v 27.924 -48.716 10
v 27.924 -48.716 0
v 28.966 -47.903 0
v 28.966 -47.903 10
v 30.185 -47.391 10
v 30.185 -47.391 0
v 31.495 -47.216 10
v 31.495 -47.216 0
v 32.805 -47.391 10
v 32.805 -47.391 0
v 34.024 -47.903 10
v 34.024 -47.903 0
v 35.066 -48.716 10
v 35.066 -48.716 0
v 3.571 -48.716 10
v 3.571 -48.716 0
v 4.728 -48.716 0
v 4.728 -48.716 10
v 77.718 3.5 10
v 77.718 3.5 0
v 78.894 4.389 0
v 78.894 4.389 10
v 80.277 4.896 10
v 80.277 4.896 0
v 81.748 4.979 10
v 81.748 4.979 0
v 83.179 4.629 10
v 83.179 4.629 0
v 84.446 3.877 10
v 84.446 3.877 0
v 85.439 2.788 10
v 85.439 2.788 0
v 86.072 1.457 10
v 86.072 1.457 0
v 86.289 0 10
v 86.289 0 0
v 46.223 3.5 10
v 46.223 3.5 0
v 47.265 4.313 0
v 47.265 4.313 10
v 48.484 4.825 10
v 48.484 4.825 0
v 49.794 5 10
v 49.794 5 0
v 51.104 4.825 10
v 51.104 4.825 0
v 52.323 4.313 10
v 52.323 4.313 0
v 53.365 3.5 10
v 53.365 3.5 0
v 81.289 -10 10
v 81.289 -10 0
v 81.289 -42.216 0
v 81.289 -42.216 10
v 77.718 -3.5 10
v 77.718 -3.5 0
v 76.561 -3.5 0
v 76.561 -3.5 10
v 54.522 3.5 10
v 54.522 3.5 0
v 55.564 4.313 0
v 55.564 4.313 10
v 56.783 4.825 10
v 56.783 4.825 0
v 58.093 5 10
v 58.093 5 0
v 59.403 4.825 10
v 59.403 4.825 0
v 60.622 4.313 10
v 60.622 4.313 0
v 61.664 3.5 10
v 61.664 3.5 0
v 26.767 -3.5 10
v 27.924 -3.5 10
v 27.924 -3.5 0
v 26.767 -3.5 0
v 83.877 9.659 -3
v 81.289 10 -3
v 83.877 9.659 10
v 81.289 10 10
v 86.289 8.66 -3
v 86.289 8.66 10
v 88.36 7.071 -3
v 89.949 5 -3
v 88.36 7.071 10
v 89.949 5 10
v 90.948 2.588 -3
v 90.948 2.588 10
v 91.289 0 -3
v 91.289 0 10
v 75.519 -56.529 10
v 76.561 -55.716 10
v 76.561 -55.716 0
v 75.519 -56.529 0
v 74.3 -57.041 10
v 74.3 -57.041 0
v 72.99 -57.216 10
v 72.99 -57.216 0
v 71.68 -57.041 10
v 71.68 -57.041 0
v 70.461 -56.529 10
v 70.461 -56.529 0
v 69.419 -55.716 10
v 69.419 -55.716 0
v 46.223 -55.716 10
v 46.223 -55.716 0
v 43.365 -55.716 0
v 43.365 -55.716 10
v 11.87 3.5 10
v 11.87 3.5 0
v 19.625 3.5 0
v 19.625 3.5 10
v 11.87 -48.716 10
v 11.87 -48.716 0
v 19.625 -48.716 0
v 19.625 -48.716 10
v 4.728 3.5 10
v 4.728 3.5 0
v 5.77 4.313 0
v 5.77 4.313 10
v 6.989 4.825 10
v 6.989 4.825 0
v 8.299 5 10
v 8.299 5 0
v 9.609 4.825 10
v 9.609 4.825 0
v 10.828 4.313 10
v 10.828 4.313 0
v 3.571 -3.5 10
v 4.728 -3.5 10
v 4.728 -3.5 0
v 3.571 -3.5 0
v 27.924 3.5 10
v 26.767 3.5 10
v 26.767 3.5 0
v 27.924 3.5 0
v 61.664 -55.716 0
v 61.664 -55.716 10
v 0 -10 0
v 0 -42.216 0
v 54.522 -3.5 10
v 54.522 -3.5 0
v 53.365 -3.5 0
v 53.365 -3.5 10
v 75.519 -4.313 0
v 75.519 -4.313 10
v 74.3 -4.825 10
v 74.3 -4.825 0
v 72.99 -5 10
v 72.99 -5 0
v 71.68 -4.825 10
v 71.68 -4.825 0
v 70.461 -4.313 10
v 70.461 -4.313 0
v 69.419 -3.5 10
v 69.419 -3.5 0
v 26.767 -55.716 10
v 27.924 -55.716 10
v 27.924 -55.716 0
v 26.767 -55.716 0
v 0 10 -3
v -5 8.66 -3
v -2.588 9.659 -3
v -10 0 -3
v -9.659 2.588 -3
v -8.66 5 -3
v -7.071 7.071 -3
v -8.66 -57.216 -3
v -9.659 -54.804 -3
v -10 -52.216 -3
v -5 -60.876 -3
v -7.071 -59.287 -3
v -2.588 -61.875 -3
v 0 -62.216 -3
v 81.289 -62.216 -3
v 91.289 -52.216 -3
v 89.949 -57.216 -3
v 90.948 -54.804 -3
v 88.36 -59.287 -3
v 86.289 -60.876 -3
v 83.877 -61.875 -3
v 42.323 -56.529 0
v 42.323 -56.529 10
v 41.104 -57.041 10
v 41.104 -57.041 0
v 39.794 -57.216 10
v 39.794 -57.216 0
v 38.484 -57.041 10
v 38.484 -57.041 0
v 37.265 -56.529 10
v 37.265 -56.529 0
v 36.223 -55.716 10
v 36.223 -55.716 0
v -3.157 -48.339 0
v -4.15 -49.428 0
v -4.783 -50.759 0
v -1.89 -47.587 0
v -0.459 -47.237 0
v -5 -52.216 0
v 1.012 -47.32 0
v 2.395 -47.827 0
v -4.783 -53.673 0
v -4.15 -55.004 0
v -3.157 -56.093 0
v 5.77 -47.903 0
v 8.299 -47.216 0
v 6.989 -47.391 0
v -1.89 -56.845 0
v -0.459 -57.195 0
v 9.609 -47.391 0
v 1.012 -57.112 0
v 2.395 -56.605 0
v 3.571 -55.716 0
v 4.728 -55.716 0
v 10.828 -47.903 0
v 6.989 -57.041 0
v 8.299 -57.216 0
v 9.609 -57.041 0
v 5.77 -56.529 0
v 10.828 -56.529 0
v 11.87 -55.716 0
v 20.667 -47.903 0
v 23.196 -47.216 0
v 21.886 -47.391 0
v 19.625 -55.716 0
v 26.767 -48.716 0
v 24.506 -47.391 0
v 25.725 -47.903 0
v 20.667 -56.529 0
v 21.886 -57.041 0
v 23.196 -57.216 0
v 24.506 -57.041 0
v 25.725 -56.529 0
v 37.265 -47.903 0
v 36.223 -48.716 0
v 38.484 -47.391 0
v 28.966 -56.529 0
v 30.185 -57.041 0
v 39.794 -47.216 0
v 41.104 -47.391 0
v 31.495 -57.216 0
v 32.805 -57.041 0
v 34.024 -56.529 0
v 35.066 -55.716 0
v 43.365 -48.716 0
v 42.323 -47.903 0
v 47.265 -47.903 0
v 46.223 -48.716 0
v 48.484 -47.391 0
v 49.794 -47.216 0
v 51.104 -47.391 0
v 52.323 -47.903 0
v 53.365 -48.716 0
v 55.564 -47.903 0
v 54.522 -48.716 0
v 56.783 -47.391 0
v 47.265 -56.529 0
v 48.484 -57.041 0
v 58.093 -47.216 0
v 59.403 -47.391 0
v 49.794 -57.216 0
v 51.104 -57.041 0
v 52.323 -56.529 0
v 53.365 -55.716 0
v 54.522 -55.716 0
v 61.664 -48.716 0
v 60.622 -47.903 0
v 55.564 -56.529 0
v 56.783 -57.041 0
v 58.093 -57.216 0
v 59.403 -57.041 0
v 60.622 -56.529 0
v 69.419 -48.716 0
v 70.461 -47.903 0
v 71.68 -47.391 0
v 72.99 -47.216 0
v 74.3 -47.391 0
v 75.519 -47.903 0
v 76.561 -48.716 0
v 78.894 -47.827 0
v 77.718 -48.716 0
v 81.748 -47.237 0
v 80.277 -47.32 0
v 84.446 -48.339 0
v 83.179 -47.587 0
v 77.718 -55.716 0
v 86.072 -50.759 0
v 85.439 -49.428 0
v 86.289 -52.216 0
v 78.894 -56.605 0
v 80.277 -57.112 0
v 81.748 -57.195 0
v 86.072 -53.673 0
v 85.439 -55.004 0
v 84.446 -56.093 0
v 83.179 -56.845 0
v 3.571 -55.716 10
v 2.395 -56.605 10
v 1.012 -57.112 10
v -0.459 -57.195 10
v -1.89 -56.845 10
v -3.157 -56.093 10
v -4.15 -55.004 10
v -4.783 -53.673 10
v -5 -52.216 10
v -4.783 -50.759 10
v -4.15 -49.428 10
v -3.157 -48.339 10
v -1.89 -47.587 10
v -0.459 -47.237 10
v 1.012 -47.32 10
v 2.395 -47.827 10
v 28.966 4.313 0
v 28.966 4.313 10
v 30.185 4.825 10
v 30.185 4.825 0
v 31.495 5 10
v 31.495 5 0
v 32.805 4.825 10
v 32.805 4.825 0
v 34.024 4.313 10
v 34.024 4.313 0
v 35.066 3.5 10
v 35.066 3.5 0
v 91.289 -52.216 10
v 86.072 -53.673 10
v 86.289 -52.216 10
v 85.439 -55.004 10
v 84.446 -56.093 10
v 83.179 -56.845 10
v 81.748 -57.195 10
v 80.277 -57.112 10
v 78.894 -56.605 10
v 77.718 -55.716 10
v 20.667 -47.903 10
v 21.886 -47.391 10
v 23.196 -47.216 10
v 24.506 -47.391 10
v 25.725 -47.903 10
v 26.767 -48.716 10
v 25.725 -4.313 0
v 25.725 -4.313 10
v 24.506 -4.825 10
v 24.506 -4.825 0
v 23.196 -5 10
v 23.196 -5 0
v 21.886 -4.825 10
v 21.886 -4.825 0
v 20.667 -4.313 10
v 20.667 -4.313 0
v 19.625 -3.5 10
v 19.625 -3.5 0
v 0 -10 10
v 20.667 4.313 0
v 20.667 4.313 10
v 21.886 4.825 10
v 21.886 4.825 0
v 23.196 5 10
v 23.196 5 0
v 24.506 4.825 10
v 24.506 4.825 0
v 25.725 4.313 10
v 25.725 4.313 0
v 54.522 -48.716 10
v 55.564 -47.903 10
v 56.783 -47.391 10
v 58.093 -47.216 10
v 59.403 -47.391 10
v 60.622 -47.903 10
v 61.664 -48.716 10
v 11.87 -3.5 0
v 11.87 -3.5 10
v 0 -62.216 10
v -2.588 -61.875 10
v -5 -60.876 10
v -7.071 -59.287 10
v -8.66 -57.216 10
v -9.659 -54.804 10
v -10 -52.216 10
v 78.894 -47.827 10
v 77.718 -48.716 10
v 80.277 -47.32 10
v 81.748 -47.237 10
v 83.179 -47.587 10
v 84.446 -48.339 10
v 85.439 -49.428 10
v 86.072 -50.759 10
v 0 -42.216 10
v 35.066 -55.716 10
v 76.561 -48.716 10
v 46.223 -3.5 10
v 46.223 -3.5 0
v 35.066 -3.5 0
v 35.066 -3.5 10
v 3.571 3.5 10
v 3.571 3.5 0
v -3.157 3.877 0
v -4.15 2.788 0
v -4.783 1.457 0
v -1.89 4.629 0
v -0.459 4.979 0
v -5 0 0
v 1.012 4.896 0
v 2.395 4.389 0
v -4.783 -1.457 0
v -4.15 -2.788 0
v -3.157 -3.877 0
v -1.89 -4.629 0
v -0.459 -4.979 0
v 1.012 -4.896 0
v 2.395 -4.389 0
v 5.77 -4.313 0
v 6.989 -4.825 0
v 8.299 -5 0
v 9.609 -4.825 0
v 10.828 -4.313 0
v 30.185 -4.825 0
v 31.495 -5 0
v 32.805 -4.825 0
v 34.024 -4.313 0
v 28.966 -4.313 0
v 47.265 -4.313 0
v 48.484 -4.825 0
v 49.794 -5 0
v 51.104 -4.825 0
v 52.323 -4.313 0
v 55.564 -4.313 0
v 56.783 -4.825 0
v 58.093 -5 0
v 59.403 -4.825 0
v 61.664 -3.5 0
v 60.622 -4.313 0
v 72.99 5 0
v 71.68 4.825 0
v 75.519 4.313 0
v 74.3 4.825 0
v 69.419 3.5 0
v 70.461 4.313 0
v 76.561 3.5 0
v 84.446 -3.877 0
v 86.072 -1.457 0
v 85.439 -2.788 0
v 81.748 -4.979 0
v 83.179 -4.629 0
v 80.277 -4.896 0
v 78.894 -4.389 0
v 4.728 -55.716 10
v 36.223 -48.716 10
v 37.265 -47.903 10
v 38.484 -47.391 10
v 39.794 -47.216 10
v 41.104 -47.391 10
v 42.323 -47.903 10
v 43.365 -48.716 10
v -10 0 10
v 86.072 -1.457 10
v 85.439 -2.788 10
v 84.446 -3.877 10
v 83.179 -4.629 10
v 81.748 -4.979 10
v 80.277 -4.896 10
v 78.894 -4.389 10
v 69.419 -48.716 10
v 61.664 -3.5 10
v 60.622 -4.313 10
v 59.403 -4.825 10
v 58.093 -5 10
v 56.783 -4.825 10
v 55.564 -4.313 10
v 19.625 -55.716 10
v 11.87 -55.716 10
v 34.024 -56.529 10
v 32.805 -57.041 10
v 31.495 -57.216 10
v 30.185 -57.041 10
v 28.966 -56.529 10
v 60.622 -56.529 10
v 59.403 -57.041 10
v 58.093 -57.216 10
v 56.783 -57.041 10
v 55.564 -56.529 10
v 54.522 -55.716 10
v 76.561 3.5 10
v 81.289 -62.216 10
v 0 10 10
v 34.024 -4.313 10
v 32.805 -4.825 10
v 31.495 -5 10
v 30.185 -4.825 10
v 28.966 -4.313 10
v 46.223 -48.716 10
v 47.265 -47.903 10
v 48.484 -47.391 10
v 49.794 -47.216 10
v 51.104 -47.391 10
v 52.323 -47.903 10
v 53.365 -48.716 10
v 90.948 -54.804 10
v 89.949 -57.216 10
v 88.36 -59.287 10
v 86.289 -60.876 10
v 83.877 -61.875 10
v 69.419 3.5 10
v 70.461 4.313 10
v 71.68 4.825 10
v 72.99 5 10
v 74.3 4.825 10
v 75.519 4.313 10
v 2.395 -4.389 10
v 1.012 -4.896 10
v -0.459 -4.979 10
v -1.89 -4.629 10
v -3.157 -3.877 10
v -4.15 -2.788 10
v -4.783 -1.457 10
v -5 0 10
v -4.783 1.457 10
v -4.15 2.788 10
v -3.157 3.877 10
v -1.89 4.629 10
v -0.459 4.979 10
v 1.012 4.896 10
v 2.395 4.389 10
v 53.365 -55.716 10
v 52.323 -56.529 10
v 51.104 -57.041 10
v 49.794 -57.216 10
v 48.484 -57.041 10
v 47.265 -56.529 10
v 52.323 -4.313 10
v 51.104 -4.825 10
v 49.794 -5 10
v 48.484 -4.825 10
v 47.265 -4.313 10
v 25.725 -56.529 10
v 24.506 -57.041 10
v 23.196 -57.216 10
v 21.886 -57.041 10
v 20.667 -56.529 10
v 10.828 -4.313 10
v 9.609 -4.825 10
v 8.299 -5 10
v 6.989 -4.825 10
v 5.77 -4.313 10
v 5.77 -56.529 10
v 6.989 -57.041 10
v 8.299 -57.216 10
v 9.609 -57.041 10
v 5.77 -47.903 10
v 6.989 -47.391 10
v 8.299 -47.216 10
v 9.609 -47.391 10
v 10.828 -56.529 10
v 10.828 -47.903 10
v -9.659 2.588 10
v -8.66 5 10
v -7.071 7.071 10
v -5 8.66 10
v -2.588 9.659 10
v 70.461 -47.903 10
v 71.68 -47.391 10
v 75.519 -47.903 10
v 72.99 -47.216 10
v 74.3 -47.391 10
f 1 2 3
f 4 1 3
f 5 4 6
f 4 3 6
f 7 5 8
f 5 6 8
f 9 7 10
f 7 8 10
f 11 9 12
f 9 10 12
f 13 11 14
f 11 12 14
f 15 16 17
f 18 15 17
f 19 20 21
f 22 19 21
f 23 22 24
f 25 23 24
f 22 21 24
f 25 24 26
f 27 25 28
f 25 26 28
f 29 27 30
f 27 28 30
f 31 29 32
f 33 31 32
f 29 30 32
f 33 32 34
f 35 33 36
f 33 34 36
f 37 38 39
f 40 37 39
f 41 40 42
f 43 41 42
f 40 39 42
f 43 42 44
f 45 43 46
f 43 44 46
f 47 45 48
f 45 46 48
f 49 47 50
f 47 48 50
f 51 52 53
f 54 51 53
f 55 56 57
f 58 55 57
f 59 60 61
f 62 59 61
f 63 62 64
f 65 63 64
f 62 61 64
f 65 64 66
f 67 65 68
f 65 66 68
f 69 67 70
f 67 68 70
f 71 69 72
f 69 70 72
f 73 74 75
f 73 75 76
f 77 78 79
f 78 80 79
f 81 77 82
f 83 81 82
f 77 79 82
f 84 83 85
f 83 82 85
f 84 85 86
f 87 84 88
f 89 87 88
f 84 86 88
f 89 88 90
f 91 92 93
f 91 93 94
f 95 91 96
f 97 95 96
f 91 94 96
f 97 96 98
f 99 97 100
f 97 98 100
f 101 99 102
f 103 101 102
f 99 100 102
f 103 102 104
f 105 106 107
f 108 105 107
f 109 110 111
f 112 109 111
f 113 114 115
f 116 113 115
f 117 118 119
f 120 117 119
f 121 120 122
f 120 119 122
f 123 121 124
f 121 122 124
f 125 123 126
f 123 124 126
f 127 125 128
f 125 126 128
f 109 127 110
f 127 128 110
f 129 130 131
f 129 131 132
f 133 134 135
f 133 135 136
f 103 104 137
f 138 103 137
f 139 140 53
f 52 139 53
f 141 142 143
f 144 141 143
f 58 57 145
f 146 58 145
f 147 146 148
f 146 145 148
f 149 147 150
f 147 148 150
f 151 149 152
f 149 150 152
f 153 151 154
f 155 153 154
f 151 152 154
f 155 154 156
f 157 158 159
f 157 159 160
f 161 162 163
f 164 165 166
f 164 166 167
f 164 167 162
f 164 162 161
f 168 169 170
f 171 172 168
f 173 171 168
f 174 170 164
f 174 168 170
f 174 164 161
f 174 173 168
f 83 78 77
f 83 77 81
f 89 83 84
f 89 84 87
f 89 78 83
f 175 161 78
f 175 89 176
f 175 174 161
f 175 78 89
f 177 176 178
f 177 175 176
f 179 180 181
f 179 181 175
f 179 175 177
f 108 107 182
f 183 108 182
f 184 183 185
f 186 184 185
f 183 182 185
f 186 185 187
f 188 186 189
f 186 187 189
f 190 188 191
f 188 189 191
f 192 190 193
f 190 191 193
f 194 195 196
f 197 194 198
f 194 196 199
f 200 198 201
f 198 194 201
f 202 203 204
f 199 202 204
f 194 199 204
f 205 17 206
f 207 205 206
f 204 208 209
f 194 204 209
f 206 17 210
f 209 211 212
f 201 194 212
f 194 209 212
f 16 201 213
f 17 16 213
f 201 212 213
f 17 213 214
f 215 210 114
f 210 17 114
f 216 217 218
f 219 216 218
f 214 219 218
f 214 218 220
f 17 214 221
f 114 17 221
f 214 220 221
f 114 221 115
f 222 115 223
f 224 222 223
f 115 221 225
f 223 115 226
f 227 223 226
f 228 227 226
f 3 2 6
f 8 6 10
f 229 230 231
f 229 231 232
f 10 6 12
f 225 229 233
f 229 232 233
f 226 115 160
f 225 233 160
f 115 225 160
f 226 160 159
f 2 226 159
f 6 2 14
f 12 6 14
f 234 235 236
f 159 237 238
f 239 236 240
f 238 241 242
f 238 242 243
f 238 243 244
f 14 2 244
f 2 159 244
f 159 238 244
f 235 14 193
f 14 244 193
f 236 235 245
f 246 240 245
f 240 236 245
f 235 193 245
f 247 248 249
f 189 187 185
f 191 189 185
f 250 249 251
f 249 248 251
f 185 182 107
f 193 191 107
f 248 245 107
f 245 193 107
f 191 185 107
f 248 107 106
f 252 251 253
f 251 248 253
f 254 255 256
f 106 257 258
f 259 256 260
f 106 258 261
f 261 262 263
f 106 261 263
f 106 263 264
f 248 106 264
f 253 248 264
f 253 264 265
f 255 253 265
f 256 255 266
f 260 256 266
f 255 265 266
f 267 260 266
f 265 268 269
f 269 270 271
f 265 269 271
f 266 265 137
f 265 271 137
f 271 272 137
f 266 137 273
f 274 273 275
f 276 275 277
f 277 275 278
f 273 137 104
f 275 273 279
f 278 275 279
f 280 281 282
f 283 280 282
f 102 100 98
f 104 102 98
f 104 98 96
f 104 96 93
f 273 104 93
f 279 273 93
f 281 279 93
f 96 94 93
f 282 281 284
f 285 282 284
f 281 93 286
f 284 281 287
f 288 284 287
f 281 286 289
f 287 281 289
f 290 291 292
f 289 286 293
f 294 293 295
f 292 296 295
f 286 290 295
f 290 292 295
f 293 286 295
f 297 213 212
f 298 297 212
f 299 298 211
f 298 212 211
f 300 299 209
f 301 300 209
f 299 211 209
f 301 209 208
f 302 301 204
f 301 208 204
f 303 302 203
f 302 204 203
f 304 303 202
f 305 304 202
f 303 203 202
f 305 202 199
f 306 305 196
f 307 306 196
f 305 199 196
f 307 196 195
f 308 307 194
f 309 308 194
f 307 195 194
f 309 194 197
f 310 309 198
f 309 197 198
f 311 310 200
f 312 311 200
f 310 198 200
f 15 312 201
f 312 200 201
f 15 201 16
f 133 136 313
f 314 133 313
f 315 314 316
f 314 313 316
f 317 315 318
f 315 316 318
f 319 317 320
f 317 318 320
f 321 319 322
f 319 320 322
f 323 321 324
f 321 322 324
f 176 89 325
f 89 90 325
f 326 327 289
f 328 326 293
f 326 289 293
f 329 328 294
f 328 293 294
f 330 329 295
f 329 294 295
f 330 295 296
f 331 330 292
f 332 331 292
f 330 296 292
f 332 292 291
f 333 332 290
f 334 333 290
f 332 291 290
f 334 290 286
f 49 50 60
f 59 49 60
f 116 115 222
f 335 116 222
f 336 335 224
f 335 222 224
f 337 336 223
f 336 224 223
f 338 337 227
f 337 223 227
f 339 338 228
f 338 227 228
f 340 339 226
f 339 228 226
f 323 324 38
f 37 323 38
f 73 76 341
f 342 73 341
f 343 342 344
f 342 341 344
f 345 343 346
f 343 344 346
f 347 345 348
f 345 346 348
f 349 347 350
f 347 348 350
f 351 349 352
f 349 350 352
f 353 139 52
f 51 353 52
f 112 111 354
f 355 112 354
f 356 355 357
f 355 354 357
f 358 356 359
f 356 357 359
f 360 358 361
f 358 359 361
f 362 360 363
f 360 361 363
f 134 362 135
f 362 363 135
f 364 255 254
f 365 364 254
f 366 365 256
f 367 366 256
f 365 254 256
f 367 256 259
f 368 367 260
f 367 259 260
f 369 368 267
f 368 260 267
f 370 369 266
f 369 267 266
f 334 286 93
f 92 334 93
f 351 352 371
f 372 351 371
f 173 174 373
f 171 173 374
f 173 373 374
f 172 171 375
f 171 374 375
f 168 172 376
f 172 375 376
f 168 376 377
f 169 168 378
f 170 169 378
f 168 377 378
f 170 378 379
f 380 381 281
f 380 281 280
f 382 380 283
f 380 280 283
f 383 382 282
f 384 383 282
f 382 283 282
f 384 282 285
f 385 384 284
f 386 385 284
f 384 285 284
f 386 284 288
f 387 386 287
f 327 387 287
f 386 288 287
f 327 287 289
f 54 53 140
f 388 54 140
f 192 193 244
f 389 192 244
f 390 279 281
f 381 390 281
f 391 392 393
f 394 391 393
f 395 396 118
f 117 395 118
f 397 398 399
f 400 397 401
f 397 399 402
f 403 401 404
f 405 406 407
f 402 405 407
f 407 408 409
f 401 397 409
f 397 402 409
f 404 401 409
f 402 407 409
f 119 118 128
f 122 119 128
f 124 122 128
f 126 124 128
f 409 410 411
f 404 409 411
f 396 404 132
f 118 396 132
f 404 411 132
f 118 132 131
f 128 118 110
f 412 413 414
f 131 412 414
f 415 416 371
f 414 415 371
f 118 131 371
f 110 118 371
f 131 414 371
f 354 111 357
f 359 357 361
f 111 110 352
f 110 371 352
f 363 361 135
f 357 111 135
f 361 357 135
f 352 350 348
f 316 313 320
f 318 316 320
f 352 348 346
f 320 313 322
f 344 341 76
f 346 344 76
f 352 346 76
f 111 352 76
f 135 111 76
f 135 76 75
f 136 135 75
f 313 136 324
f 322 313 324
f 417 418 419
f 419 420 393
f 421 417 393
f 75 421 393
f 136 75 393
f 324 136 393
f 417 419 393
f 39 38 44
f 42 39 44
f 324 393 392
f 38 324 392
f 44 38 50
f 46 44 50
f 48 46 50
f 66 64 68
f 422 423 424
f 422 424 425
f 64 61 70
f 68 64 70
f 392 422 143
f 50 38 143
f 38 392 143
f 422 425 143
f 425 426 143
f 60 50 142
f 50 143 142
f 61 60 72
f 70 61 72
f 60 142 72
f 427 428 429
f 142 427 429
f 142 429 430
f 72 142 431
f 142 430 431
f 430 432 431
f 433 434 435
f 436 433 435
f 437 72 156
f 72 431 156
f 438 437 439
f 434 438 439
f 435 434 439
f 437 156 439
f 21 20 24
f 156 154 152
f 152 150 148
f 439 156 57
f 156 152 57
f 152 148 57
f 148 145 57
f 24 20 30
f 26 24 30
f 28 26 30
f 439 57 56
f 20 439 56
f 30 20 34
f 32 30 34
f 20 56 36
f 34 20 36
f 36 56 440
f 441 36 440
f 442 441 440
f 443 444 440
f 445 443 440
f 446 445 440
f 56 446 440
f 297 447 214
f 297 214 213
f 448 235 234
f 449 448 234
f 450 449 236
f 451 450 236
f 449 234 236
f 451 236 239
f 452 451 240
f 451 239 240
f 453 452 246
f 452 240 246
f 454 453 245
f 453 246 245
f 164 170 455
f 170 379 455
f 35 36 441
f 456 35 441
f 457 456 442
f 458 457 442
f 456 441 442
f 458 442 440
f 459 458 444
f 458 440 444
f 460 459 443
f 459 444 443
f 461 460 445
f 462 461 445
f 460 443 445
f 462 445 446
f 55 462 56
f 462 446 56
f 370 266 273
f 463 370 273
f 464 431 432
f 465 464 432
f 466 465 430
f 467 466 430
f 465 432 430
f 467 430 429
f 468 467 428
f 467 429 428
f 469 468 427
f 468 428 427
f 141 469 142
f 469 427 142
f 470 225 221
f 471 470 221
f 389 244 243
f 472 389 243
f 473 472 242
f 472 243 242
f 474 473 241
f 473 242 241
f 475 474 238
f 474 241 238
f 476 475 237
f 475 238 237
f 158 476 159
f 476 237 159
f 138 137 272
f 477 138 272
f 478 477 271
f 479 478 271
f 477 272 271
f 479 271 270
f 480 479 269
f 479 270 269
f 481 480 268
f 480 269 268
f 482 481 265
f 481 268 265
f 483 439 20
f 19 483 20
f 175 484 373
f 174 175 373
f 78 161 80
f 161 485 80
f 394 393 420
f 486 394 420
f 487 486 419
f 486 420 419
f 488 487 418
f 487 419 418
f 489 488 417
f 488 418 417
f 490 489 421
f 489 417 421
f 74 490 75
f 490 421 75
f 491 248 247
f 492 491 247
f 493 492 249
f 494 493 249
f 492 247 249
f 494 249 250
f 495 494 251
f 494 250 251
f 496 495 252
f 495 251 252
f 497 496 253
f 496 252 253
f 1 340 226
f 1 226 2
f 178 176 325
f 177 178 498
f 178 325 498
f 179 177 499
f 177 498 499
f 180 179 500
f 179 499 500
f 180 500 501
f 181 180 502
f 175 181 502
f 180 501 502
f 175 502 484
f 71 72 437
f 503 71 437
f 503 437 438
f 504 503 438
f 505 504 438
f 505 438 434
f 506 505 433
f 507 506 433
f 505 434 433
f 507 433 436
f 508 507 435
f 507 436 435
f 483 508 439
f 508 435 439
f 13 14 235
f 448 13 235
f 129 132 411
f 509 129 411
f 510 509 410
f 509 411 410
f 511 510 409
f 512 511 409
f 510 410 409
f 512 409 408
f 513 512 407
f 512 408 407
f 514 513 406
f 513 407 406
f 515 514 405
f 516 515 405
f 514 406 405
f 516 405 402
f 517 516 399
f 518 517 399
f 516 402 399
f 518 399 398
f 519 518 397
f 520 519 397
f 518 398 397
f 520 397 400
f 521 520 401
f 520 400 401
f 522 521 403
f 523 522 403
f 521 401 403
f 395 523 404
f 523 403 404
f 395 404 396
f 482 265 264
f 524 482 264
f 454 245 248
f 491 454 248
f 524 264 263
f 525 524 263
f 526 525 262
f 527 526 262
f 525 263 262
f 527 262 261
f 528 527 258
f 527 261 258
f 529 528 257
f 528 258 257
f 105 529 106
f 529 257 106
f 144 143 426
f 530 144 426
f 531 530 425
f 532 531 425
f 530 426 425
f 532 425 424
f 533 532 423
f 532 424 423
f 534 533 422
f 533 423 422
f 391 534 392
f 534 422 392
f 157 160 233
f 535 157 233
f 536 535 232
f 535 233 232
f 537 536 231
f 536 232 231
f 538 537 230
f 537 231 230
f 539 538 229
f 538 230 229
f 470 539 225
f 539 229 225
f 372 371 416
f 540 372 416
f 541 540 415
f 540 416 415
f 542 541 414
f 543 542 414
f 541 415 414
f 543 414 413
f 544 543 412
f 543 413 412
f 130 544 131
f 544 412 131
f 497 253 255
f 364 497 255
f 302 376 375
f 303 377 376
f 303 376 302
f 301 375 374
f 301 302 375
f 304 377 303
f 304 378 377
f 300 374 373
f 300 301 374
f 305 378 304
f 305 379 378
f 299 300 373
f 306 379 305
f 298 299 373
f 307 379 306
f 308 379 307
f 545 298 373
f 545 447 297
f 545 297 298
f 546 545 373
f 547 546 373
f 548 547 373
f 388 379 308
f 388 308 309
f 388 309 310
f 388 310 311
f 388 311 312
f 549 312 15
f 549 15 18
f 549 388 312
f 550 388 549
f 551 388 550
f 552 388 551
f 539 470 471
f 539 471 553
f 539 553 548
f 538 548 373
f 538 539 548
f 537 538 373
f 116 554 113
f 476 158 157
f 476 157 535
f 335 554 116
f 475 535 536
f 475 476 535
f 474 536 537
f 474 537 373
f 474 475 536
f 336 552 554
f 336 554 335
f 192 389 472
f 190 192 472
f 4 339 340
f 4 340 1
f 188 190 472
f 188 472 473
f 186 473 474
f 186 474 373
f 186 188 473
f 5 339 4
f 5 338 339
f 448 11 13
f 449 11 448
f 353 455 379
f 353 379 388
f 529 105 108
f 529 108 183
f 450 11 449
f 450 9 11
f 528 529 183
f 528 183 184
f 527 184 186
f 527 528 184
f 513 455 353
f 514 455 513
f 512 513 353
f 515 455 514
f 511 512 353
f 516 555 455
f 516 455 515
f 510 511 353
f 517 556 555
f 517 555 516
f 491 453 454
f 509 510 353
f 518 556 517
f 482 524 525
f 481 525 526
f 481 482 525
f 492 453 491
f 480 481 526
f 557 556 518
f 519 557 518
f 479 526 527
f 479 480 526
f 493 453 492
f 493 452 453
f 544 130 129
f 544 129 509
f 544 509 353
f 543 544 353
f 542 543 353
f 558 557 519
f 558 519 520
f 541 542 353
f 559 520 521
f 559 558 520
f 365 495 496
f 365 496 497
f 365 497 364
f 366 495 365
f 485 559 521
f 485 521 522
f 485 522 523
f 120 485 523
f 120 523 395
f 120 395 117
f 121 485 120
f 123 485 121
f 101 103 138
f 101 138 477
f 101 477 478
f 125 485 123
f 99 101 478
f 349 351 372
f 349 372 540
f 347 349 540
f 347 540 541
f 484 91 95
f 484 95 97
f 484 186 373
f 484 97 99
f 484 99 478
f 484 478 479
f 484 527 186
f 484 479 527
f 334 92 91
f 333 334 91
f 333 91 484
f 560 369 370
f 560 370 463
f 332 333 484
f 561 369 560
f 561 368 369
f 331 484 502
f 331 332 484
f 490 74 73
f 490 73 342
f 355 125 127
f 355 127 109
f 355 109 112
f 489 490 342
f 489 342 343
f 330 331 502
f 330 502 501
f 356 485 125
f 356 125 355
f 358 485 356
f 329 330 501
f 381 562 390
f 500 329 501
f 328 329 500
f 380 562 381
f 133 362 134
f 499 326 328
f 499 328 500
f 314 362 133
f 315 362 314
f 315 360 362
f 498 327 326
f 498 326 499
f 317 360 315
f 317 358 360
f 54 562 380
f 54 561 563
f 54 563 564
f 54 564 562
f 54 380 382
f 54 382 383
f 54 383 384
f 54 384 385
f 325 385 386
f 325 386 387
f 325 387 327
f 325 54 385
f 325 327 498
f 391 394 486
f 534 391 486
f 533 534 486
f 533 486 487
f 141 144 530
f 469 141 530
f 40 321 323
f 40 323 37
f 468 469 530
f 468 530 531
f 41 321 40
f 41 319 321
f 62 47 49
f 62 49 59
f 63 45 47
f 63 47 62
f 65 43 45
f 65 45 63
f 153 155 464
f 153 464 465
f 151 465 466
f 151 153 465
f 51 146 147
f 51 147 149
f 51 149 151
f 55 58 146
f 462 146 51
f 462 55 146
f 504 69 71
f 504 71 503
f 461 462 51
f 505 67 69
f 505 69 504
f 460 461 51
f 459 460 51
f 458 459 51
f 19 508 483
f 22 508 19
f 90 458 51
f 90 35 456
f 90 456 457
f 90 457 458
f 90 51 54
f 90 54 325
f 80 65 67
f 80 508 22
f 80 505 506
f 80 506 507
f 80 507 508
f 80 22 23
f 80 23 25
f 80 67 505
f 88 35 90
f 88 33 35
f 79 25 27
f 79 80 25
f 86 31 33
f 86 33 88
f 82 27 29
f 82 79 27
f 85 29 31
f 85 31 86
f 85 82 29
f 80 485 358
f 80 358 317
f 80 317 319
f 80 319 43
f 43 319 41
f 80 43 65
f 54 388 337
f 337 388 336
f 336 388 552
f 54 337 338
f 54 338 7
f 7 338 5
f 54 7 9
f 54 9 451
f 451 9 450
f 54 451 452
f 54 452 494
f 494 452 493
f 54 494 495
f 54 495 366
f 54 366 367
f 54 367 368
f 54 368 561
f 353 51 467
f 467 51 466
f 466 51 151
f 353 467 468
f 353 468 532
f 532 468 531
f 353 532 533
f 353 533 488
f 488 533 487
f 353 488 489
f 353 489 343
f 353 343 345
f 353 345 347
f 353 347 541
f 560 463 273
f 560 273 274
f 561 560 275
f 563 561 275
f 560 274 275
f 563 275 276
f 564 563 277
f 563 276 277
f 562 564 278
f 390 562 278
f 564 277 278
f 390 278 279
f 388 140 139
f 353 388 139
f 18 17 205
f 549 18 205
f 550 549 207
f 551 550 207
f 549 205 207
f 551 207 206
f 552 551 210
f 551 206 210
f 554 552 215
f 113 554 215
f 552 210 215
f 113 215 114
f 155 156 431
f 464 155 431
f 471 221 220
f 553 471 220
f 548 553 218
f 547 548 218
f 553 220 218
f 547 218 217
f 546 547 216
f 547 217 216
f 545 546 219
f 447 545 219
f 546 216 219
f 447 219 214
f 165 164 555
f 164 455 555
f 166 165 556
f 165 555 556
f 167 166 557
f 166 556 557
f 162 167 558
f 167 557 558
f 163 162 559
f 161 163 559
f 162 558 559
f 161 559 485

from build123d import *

# Parameters (mm, degrees)
F1_DEPTH = 10
F3_DEPTH = 3


with BuildPart() as f1:
    # F0 (on Top) → F1 (new body)
    with BuildSketch(Plane.XY):
        with BuildLine():
            Line((81.289, 10), (0, 10))
            ThreePointArc((0, 10), (-7.071068, 7.071068), (-10, 0))
            Line((-10, 0), (-10, -26.108))
            Line((-10, -26.108), (-10, -52.216))
            ThreePointArc((-10, -52.216), (-7.071068, -59.287068), (0, -62.216))
            Line((0, -62.216), (81.289, -62.216))
            ThreePointArc((81.289, -62.216), (88.360068, -59.287068), (91.289, -52.216))
            Line((91.289, -52.216), (91.289, -26.108))
            Line((91.289, -26.108), (91.289, 0))
            ThreePointArc((91.289, 0), (88.360068, 7.071068), (81.289, 10))
        make_face()
        with BuildLine():
            ThreePointArc((3.570714, -55.716), (-5, -52.216), (3.570714, -48.716))
            Line((3.570714, -48.716), (4.728286, -48.716))
            ThreePointArc((4.728286, -48.716), (8.299, -47.216), (11.869714, -48.716))
            Line((11.869714, -48.716), (19.625286, -48.716))
            ThreePointArc((19.625286, -48.716), (23.196, -47.216), (26.766714, -48.716))
            Line((26.766714, -48.716), (27.924286, -48.716))
            ThreePointArc((27.924286, -48.716), (31.495, -47.216), (35.065714, -48.716))
            Line((35.065714, -48.716), (36.223286, -48.716))
            ThreePointArc((36.223286, -48.716), (39.794, -47.216), (43.364714, -48.716))
            Line((43.364714, -48.716), (46.223286, -48.716))
            ThreePointArc((46.223286, -48.716), (49.794, -47.216), (53.364714, -48.716))
            Line((53.364714, -48.716), (54.522286, -48.716))
            ThreePointArc((54.522286, -48.716), (58.093, -47.216), (61.663714, -48.716))
            Line((61.663714, -48.716), (69.419286, -48.716))
            ThreePointArc((69.419286, -48.716), (72.99, -47.216), (76.560714, -48.716))
            Line((76.560714, -48.716), (77.718286, -48.716))
            ThreePointArc((77.718286, -48.716), (83.179295, -47.587092), (86.289, -52.216))
            ThreePointArc((86.289, -52.216), (83.179295, -56.844908), (77.718286, -55.716))
            Line((77.718286, -55.716), (76.560714, -55.716))
            ThreePointArc((76.560714, -55.716), (72.99, -57.216), (69.419286, -55.716))
            Line((69.419286, -55.716), (61.663714, -55.716))
            ThreePointArc((61.663714, -55.716), (58.093, -57.216), (54.522286, -55.716))
            Line((54.522286, -55.716), (53.364714, -55.716))
            ThreePointArc((53.364714, -55.716), (49.794, -57.216), (46.223286, -55.716))
            Line((46.223286, -55.716), (43.364714, -55.716))
            ThreePointArc((43.364714, -55.716), (39.794, -57.216), (36.223286, -55.716))
            Line((36.223286, -55.716), (35.065714, -55.716))
            ThreePointArc((35.065714, -55.716), (31.495, -57.216), (27.924286, -55.716))
            Line((27.924286, -55.716), (26.766714, -55.716))
            ThreePointArc((26.766714, -55.716), (23.196, -57.216), (19.625286, -55.716))
            Line((19.625286, -55.716), (11.869714, -55.716))
            ThreePointArc((11.869714, -55.716), (8.299, -57.216), (4.728286, -55.716))
            Line((4.728286, -55.716), (3.570714, -55.716))
        make_face(mode=Mode.SUBTRACT)
        Polygon((0, -42.216), (0, -26.108), (0, -10), (81.289, -10), (81.289, -26.108), (81.289, -42.216), align=None, mode=Mode.SUBTRACT)
        with BuildLine():
            ThreePointArc((3.570714, -3.5), (-5, 0), (3.570714, 3.5))
            Line((3.570714, 3.5), (4.728286, 3.5))
            ThreePointArc((4.728286, 3.5), (8.299, 5), (11.869714, 3.5))
            Line((11.869714, 3.5), (19.625286, 3.5))
            ThreePointArc((19.625286, 3.5), (23.196, 5), (26.766714, 3.5))
            Line((26.766714, 3.5), (27.924286, 3.5))
            ThreePointArc((27.924286, 3.5), (31.495, 5), (35.065714, 3.5))
            Line((35.065714, 3.5), (46.223286, 3.5))
            ThreePointArc((46.223286, 3.5), (49.794, 5), (53.364714, 3.5))
            Line((53.364714, 3.5), (54.522286, 3.5))
            ThreePointArc((54.522286, 3.5), (58.093, 5), (61.663714, 3.5))
            Line((61.663714, 3.5), (69.419286, 3.5))
            ThreePointArc((69.419286, 3.5), (72.99, 5), (76.560714, 3.5))
            Line((76.560714, 3.5), (77.718286, 3.5))
            ThreePointArc((77.718286, 3.5), (83.179295, 4.628908), (86.289, 0))
            ThreePointArc((86.289, 0), (83.179295, -4.628908), (77.718286, -3.5))
            Line((77.718286, -3.5), (76.560714, -3.5))
            ThreePointArc((76.560714, -3.5), (72.99, -5), (69.419286, -3.5))
            Line((69.419286, -3.5), (61.663714, -3.5))
            ThreePointArc((61.663714, -3.5), (58.093, -5), (54.522286, -3.5))
            Line((54.522286, -3.5), (53.364714, -3.5))
            ThreePointArc((53.364714, -3.5), (49.794, -5), (46.223286, -3.5))
            Line((46.223286, -3.5), (35.065714, -3.5))
            ThreePointArc((35.065714, -3.5), (31.495, -5), (27.924286, -3.5))
            Line((27.924286, -3.5), (26.766714, -3.5))
            ThreePointArc((26.766714, -3.5), (23.196, -5), (19.625286, -3.5))
            Line((19.625286, -3.5), (11.869714, -3.5))
            ThreePointArc((11.869714, -3.5), (8.299, -5), (4.728286, -3.5))
            Line((4.728286, -3.5), (3.570714, -3.5))
        make_face(mode=Mode.SUBTRACT)
    extrude(amount=F1_DEPTH)

    # F2 (on face) → F3 (join)
    with BuildSketch(Plane(origin=(0, 0, 0), x_dir=(1, 0, 0), z_dir=(0, 0, -1))):
        with BuildLine():
            ThreePointArc((0, 62.216), (-7.071068, 59.287068), (-10, 52.216))
            Line((-10, 52.216), (-10, 0))
            ThreePointArc((-10, 0), (-7.071068, -7.071068), (0, -10))
            Line((0, -10), (81.289, -10))
            ThreePointArc((81.289, -10), (88.360068, -7.071068), (91.289, 0))
            Line((91.289, 0), (91.289, 52.216))
            ThreePointArc((91.289, 52.216), (88.360068, 59.287068), (81.289, 62.216))
            Line((81.289, 62.216), (0, 62.216))
        make_face()
    extrude(amount=F3_DEPTH)


solid = f1.part
